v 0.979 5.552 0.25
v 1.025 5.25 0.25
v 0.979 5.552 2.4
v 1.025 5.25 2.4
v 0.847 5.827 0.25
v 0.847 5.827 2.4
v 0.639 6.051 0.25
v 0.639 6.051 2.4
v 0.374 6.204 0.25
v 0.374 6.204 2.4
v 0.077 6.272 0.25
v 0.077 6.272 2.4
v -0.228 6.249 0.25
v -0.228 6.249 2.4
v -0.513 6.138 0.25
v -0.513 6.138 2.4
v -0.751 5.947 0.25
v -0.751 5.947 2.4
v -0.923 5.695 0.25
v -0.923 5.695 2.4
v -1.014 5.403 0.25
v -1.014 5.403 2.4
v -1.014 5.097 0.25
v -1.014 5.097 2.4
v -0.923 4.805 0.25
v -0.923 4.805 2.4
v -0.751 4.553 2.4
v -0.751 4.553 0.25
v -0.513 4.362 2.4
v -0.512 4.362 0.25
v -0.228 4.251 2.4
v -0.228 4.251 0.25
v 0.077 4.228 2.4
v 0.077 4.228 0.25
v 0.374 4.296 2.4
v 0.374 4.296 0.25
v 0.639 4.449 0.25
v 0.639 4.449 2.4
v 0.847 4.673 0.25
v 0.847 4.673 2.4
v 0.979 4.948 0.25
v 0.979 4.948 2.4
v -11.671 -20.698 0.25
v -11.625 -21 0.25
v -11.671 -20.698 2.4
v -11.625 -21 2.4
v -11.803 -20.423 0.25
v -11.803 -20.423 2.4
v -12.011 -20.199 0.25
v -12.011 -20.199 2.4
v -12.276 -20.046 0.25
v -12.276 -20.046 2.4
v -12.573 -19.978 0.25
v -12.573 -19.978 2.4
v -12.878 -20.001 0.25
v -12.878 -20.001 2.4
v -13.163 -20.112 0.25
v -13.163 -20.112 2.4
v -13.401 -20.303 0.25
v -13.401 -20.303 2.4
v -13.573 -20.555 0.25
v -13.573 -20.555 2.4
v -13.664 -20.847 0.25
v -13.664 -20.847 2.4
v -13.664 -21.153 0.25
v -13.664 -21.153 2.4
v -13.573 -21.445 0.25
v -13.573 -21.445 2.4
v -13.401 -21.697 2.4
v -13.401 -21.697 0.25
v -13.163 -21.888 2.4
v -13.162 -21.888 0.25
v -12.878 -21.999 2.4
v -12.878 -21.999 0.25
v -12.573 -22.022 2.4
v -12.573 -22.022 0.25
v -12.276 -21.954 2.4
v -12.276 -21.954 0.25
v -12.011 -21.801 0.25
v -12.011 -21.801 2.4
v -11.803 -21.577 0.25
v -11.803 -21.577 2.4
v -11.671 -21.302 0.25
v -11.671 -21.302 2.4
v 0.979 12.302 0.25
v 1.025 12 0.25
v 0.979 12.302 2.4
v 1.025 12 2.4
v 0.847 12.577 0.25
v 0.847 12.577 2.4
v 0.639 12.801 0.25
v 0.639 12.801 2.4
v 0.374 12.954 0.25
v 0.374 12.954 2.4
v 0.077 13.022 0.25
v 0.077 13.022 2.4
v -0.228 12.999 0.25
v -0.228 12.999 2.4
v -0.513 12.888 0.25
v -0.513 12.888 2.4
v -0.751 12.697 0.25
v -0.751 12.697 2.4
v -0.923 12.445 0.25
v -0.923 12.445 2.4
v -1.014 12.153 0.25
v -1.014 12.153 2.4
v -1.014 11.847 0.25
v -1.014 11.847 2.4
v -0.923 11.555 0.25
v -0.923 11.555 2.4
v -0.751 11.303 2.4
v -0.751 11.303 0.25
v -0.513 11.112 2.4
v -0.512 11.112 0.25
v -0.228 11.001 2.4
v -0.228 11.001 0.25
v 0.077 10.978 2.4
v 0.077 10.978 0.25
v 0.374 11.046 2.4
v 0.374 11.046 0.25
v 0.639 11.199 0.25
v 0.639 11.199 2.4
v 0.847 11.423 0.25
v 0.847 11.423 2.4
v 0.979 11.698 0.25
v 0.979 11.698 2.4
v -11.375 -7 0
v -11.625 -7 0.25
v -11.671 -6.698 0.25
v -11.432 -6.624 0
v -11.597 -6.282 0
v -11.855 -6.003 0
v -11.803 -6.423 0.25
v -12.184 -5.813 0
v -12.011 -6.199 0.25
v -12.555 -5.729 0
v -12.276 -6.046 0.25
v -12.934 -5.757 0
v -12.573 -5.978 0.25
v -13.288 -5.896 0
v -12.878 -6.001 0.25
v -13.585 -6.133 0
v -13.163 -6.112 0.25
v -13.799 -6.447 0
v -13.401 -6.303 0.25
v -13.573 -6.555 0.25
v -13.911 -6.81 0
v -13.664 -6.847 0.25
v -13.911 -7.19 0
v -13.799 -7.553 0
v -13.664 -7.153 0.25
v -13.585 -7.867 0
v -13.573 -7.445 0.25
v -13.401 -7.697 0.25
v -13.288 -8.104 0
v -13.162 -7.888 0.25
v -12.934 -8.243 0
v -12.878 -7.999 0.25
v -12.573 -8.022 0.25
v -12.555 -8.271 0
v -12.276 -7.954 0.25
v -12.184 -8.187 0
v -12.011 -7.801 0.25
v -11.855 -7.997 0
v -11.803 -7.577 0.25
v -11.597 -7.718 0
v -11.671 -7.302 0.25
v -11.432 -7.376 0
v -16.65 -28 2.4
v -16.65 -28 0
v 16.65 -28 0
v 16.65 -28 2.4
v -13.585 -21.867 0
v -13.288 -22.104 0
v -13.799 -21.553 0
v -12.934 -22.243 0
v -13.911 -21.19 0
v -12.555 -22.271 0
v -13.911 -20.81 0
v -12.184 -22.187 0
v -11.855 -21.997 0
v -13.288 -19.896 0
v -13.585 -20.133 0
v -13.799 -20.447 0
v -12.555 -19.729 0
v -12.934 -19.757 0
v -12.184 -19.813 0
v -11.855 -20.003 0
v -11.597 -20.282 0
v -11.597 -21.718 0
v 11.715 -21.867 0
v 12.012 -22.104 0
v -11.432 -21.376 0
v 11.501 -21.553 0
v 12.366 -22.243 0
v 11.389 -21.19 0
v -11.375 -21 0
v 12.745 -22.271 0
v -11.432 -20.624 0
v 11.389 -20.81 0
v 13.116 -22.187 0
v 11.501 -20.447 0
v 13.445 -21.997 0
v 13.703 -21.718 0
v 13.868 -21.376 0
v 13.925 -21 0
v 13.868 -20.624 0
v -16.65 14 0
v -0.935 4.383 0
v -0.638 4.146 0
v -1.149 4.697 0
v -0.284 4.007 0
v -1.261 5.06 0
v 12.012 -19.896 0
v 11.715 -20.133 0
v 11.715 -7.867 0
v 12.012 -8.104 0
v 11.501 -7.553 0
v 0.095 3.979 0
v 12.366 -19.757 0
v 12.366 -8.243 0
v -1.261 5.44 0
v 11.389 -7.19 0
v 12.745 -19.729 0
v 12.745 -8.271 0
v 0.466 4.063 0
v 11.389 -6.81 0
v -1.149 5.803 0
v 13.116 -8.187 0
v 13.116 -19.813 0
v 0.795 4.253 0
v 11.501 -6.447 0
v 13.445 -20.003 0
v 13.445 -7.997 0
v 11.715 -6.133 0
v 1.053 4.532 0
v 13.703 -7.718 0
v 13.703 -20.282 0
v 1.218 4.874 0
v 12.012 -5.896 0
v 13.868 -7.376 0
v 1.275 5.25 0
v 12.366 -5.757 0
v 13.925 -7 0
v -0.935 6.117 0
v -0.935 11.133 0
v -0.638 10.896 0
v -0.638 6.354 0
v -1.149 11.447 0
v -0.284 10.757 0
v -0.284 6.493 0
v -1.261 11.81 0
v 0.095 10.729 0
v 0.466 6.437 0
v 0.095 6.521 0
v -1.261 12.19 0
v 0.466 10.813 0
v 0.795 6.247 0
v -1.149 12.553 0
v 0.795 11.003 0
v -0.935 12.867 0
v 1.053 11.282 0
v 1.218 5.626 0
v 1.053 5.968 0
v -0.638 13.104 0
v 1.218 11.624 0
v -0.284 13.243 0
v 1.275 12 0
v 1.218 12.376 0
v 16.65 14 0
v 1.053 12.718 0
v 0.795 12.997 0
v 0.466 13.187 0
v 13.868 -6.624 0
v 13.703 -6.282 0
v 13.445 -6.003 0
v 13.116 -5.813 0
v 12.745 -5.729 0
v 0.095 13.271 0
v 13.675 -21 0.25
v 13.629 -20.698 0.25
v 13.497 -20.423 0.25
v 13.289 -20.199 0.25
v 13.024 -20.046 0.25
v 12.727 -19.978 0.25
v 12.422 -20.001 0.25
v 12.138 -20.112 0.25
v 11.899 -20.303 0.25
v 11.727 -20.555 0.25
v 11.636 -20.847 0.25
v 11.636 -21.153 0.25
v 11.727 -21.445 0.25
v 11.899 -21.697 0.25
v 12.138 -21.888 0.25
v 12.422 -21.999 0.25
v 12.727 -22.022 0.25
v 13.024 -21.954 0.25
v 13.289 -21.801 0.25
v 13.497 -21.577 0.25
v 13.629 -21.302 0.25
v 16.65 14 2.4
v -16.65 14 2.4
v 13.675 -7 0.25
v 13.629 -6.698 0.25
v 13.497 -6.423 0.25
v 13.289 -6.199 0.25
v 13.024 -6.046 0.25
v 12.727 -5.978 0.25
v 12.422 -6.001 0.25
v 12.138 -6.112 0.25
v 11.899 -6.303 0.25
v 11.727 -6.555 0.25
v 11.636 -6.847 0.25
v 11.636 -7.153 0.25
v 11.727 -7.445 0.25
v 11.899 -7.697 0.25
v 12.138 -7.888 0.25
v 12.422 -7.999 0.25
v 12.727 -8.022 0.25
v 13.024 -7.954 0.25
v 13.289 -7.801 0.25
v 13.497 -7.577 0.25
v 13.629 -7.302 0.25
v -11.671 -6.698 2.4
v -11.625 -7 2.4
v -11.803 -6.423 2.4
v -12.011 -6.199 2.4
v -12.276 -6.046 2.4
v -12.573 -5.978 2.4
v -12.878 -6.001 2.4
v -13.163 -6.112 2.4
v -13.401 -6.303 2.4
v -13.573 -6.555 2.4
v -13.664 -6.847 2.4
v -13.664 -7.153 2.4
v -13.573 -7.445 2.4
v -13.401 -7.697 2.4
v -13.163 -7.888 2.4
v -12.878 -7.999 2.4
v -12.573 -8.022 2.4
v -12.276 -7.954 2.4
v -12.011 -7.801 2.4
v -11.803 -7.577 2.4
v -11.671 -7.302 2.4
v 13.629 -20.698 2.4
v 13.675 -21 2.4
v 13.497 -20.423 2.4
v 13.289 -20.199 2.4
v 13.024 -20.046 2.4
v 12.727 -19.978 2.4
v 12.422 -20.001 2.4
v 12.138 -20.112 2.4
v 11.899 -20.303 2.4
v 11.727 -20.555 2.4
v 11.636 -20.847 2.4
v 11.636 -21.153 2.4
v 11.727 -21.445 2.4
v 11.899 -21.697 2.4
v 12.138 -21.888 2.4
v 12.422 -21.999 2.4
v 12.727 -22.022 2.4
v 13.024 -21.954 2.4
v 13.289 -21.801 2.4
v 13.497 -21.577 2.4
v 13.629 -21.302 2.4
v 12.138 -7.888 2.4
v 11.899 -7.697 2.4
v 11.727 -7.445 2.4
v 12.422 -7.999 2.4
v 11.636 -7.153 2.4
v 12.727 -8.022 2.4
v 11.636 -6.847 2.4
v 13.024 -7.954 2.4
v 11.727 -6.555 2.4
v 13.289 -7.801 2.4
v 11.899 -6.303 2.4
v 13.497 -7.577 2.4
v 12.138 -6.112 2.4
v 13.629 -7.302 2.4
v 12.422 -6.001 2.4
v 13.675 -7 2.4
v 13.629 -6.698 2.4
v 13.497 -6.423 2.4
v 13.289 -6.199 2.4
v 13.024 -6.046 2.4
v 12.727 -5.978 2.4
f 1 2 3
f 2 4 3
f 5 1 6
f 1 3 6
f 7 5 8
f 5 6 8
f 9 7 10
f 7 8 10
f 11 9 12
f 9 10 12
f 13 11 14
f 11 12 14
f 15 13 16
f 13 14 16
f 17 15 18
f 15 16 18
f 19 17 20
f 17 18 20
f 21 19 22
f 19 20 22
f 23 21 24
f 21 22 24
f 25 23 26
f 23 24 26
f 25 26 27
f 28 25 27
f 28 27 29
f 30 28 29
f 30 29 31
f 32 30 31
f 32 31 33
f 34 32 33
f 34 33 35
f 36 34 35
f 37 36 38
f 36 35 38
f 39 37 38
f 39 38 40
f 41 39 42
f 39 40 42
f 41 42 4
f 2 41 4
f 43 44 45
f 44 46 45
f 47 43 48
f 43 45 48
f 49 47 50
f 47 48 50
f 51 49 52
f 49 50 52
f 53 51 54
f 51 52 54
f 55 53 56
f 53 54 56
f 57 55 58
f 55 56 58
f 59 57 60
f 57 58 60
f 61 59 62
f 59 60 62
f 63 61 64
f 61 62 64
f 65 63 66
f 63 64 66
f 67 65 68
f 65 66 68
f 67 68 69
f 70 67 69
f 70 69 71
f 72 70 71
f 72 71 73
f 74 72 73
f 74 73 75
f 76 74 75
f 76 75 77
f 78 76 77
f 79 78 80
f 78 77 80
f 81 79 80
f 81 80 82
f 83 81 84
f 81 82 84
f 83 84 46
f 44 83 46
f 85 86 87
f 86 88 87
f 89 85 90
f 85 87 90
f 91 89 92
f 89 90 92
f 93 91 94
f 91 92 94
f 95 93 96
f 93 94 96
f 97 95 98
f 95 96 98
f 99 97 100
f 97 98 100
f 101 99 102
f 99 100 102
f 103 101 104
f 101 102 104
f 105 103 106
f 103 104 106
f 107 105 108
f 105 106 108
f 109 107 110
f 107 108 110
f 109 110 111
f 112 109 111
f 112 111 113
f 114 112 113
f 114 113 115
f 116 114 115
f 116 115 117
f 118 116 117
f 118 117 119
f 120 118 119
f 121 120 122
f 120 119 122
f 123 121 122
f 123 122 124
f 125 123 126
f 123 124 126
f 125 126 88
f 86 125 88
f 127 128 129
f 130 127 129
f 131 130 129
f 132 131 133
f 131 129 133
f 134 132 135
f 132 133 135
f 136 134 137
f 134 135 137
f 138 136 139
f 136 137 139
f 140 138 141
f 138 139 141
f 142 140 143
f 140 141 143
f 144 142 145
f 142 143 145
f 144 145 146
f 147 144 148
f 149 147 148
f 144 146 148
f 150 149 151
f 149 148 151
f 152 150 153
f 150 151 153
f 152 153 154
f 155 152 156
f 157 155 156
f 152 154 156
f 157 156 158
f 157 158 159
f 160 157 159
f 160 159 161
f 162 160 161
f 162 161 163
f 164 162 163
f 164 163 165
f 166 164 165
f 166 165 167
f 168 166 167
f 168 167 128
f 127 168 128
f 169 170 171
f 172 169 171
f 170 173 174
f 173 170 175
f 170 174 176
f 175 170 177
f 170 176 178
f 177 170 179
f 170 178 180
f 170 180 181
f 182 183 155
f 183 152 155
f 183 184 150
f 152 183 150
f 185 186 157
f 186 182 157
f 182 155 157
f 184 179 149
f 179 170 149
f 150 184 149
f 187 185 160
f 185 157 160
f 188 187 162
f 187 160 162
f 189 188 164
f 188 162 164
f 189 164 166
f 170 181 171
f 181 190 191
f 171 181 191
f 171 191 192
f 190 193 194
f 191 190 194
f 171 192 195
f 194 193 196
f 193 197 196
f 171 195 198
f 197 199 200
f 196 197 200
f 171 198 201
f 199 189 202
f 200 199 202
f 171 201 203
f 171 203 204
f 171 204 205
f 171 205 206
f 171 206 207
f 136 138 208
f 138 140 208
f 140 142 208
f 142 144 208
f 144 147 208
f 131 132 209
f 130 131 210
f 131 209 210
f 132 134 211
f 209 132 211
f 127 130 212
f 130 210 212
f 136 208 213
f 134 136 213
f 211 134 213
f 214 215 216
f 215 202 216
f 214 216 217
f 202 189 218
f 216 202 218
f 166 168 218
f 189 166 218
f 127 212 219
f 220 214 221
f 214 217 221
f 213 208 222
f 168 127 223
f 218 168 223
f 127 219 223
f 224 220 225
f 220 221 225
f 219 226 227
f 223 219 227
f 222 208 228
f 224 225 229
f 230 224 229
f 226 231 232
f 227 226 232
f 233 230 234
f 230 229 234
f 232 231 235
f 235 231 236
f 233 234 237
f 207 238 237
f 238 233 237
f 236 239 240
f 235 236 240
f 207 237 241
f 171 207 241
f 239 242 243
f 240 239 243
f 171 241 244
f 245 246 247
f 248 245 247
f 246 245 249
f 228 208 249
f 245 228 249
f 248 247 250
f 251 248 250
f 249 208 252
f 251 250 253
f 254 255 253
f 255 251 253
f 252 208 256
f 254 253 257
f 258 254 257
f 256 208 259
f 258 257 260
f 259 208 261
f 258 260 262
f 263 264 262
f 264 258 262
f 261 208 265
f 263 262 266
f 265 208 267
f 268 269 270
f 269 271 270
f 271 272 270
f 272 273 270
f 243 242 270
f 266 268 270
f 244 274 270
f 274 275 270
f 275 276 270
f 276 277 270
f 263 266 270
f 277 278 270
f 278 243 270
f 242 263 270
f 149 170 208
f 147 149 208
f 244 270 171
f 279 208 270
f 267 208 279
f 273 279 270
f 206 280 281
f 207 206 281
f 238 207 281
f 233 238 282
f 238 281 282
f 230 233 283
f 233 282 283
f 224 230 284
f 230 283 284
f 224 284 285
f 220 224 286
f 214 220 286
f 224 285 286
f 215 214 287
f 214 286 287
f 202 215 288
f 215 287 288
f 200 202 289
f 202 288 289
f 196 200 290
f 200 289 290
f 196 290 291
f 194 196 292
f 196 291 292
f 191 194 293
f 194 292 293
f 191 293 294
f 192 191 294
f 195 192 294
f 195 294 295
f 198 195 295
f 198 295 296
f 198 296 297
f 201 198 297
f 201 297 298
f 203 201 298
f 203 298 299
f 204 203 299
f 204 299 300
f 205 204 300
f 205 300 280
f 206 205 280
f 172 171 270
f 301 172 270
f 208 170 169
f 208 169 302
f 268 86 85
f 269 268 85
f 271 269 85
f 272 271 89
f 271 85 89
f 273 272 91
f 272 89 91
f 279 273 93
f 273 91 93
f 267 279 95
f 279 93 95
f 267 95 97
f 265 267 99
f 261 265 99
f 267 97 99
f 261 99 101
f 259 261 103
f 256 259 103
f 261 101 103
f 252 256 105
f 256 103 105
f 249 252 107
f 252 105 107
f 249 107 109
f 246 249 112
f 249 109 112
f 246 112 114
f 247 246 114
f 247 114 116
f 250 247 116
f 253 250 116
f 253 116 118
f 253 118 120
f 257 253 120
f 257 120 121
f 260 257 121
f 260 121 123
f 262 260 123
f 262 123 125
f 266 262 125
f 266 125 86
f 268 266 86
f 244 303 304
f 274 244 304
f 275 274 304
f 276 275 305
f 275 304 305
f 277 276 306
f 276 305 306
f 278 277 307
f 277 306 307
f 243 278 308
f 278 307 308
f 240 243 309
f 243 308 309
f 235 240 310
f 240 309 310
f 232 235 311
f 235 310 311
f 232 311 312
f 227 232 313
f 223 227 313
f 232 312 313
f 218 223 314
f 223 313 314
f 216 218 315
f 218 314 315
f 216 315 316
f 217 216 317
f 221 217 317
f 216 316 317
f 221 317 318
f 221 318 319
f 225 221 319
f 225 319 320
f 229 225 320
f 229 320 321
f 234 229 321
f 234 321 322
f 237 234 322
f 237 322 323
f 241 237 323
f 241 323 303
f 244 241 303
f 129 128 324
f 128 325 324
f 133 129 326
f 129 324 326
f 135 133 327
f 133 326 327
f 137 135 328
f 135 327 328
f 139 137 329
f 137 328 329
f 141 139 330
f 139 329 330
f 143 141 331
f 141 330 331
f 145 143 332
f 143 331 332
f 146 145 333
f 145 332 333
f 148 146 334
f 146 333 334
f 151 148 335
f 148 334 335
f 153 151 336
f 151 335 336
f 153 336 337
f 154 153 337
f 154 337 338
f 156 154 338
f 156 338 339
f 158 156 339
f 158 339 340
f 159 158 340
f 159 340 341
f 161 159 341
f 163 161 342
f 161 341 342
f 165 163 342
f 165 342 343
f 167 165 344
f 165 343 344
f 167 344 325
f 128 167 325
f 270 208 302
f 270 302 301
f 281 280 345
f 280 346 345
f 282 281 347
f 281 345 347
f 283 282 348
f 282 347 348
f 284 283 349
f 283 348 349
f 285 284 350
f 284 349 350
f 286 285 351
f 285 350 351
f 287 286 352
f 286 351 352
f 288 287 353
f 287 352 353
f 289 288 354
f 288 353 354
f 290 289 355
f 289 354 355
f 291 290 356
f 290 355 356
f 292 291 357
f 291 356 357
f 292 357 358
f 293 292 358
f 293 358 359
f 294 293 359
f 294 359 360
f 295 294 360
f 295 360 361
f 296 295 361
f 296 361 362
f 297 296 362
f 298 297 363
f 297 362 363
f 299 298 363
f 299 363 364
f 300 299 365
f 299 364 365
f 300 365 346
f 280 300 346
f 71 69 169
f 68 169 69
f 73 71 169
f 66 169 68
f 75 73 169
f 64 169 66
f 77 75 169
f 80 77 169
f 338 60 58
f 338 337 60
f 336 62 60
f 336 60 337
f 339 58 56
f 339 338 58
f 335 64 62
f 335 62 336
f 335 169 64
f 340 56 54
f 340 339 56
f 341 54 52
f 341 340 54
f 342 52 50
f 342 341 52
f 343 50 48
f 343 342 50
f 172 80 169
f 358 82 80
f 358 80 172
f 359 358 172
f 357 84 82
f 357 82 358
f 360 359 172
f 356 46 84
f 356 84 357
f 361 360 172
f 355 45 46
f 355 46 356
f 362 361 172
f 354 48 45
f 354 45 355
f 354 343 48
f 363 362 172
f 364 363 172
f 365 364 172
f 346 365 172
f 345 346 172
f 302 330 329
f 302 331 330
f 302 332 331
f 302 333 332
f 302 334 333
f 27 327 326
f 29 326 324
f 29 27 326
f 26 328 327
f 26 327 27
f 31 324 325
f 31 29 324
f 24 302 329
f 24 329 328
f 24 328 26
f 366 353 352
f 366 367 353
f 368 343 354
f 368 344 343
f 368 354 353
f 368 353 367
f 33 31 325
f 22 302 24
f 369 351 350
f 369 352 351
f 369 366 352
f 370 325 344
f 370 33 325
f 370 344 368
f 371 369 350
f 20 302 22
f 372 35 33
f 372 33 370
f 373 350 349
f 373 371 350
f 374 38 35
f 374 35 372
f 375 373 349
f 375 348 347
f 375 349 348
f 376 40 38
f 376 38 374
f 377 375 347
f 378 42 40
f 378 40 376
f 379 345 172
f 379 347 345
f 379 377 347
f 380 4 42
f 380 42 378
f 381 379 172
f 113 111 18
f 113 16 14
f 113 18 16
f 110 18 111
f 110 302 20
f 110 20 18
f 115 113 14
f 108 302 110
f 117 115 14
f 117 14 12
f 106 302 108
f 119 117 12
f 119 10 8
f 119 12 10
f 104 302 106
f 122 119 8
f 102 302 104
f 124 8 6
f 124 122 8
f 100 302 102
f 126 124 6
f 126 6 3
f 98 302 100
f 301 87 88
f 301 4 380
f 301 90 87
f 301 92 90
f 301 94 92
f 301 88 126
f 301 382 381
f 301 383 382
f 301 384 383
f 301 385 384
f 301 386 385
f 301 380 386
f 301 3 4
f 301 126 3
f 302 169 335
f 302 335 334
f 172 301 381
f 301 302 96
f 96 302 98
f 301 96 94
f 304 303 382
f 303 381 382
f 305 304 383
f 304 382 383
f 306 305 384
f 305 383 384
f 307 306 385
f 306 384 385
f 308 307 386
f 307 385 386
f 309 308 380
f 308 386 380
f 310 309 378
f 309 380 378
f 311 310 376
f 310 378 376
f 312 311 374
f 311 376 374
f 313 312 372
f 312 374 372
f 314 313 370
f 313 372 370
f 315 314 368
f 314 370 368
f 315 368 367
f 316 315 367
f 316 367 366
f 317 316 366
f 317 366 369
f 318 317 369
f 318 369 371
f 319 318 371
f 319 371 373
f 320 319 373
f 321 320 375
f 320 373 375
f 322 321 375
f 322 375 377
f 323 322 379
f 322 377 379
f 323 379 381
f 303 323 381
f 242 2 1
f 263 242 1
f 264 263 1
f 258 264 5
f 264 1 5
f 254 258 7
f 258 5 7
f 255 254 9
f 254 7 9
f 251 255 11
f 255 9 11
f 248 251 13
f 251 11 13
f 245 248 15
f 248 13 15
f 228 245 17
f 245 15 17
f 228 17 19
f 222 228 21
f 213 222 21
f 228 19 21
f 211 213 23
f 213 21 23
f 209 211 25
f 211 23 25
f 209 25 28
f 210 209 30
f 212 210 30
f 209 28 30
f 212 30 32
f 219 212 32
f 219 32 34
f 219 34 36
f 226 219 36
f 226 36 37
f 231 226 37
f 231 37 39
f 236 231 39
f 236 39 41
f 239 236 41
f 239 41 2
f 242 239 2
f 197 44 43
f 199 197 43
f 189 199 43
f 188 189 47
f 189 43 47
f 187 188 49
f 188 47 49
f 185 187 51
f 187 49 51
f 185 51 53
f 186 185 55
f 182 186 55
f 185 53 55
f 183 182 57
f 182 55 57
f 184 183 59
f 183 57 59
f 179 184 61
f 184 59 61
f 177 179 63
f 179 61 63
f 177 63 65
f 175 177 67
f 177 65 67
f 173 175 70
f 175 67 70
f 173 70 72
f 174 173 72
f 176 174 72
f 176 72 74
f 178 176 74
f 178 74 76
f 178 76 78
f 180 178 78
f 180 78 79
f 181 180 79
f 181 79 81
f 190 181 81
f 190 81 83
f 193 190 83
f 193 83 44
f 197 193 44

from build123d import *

# Parameters (mm, degrees)
SKETCH1_W                     = 33.3
SKETCH1_H                     = 42
BOSS_EXTRUDE1_DEPTH           = 2.4
M2_5_TAPPED_HOLE1_D           = 2.05
M2_5_TAPPED_HOLE1_CSINK_D     = 2.55
M2_5_TAPPED_HOLE1_CSINK_ANGLE = 90


with BuildPart() as part:
    # Sketch1 → Boss-Extrude1 (new body)
    with BuildSketch(Plane.XY):
        with Locations((0, -7)):
            Rectangle(SKETCH1_W, SKETCH1_H)
    extrude(amount=BOSS_EXTRUDE1_DEPTH)

    # M2.5 Tapped Hole1 (through all)
    with Locations(Plane(origin=(0, 12, 0), x_dir=(-1, 0, 0), z_dir=(0, 0, -1))):
        with Locations((0, 0), (0, -6.75), (12.65, -19), (12.65, -33), (-12.65, -33), (-12.65, -19)):
            CounterSinkHole(M2_5_TAPPED_HOLE1_D / 2, M2_5_TAPPED_HOLE1_CSINK_D / 2, counter_sink_angle=M2_5_TAPPED_HOLE1_CSINK_ANGLE)


solid = part.part
